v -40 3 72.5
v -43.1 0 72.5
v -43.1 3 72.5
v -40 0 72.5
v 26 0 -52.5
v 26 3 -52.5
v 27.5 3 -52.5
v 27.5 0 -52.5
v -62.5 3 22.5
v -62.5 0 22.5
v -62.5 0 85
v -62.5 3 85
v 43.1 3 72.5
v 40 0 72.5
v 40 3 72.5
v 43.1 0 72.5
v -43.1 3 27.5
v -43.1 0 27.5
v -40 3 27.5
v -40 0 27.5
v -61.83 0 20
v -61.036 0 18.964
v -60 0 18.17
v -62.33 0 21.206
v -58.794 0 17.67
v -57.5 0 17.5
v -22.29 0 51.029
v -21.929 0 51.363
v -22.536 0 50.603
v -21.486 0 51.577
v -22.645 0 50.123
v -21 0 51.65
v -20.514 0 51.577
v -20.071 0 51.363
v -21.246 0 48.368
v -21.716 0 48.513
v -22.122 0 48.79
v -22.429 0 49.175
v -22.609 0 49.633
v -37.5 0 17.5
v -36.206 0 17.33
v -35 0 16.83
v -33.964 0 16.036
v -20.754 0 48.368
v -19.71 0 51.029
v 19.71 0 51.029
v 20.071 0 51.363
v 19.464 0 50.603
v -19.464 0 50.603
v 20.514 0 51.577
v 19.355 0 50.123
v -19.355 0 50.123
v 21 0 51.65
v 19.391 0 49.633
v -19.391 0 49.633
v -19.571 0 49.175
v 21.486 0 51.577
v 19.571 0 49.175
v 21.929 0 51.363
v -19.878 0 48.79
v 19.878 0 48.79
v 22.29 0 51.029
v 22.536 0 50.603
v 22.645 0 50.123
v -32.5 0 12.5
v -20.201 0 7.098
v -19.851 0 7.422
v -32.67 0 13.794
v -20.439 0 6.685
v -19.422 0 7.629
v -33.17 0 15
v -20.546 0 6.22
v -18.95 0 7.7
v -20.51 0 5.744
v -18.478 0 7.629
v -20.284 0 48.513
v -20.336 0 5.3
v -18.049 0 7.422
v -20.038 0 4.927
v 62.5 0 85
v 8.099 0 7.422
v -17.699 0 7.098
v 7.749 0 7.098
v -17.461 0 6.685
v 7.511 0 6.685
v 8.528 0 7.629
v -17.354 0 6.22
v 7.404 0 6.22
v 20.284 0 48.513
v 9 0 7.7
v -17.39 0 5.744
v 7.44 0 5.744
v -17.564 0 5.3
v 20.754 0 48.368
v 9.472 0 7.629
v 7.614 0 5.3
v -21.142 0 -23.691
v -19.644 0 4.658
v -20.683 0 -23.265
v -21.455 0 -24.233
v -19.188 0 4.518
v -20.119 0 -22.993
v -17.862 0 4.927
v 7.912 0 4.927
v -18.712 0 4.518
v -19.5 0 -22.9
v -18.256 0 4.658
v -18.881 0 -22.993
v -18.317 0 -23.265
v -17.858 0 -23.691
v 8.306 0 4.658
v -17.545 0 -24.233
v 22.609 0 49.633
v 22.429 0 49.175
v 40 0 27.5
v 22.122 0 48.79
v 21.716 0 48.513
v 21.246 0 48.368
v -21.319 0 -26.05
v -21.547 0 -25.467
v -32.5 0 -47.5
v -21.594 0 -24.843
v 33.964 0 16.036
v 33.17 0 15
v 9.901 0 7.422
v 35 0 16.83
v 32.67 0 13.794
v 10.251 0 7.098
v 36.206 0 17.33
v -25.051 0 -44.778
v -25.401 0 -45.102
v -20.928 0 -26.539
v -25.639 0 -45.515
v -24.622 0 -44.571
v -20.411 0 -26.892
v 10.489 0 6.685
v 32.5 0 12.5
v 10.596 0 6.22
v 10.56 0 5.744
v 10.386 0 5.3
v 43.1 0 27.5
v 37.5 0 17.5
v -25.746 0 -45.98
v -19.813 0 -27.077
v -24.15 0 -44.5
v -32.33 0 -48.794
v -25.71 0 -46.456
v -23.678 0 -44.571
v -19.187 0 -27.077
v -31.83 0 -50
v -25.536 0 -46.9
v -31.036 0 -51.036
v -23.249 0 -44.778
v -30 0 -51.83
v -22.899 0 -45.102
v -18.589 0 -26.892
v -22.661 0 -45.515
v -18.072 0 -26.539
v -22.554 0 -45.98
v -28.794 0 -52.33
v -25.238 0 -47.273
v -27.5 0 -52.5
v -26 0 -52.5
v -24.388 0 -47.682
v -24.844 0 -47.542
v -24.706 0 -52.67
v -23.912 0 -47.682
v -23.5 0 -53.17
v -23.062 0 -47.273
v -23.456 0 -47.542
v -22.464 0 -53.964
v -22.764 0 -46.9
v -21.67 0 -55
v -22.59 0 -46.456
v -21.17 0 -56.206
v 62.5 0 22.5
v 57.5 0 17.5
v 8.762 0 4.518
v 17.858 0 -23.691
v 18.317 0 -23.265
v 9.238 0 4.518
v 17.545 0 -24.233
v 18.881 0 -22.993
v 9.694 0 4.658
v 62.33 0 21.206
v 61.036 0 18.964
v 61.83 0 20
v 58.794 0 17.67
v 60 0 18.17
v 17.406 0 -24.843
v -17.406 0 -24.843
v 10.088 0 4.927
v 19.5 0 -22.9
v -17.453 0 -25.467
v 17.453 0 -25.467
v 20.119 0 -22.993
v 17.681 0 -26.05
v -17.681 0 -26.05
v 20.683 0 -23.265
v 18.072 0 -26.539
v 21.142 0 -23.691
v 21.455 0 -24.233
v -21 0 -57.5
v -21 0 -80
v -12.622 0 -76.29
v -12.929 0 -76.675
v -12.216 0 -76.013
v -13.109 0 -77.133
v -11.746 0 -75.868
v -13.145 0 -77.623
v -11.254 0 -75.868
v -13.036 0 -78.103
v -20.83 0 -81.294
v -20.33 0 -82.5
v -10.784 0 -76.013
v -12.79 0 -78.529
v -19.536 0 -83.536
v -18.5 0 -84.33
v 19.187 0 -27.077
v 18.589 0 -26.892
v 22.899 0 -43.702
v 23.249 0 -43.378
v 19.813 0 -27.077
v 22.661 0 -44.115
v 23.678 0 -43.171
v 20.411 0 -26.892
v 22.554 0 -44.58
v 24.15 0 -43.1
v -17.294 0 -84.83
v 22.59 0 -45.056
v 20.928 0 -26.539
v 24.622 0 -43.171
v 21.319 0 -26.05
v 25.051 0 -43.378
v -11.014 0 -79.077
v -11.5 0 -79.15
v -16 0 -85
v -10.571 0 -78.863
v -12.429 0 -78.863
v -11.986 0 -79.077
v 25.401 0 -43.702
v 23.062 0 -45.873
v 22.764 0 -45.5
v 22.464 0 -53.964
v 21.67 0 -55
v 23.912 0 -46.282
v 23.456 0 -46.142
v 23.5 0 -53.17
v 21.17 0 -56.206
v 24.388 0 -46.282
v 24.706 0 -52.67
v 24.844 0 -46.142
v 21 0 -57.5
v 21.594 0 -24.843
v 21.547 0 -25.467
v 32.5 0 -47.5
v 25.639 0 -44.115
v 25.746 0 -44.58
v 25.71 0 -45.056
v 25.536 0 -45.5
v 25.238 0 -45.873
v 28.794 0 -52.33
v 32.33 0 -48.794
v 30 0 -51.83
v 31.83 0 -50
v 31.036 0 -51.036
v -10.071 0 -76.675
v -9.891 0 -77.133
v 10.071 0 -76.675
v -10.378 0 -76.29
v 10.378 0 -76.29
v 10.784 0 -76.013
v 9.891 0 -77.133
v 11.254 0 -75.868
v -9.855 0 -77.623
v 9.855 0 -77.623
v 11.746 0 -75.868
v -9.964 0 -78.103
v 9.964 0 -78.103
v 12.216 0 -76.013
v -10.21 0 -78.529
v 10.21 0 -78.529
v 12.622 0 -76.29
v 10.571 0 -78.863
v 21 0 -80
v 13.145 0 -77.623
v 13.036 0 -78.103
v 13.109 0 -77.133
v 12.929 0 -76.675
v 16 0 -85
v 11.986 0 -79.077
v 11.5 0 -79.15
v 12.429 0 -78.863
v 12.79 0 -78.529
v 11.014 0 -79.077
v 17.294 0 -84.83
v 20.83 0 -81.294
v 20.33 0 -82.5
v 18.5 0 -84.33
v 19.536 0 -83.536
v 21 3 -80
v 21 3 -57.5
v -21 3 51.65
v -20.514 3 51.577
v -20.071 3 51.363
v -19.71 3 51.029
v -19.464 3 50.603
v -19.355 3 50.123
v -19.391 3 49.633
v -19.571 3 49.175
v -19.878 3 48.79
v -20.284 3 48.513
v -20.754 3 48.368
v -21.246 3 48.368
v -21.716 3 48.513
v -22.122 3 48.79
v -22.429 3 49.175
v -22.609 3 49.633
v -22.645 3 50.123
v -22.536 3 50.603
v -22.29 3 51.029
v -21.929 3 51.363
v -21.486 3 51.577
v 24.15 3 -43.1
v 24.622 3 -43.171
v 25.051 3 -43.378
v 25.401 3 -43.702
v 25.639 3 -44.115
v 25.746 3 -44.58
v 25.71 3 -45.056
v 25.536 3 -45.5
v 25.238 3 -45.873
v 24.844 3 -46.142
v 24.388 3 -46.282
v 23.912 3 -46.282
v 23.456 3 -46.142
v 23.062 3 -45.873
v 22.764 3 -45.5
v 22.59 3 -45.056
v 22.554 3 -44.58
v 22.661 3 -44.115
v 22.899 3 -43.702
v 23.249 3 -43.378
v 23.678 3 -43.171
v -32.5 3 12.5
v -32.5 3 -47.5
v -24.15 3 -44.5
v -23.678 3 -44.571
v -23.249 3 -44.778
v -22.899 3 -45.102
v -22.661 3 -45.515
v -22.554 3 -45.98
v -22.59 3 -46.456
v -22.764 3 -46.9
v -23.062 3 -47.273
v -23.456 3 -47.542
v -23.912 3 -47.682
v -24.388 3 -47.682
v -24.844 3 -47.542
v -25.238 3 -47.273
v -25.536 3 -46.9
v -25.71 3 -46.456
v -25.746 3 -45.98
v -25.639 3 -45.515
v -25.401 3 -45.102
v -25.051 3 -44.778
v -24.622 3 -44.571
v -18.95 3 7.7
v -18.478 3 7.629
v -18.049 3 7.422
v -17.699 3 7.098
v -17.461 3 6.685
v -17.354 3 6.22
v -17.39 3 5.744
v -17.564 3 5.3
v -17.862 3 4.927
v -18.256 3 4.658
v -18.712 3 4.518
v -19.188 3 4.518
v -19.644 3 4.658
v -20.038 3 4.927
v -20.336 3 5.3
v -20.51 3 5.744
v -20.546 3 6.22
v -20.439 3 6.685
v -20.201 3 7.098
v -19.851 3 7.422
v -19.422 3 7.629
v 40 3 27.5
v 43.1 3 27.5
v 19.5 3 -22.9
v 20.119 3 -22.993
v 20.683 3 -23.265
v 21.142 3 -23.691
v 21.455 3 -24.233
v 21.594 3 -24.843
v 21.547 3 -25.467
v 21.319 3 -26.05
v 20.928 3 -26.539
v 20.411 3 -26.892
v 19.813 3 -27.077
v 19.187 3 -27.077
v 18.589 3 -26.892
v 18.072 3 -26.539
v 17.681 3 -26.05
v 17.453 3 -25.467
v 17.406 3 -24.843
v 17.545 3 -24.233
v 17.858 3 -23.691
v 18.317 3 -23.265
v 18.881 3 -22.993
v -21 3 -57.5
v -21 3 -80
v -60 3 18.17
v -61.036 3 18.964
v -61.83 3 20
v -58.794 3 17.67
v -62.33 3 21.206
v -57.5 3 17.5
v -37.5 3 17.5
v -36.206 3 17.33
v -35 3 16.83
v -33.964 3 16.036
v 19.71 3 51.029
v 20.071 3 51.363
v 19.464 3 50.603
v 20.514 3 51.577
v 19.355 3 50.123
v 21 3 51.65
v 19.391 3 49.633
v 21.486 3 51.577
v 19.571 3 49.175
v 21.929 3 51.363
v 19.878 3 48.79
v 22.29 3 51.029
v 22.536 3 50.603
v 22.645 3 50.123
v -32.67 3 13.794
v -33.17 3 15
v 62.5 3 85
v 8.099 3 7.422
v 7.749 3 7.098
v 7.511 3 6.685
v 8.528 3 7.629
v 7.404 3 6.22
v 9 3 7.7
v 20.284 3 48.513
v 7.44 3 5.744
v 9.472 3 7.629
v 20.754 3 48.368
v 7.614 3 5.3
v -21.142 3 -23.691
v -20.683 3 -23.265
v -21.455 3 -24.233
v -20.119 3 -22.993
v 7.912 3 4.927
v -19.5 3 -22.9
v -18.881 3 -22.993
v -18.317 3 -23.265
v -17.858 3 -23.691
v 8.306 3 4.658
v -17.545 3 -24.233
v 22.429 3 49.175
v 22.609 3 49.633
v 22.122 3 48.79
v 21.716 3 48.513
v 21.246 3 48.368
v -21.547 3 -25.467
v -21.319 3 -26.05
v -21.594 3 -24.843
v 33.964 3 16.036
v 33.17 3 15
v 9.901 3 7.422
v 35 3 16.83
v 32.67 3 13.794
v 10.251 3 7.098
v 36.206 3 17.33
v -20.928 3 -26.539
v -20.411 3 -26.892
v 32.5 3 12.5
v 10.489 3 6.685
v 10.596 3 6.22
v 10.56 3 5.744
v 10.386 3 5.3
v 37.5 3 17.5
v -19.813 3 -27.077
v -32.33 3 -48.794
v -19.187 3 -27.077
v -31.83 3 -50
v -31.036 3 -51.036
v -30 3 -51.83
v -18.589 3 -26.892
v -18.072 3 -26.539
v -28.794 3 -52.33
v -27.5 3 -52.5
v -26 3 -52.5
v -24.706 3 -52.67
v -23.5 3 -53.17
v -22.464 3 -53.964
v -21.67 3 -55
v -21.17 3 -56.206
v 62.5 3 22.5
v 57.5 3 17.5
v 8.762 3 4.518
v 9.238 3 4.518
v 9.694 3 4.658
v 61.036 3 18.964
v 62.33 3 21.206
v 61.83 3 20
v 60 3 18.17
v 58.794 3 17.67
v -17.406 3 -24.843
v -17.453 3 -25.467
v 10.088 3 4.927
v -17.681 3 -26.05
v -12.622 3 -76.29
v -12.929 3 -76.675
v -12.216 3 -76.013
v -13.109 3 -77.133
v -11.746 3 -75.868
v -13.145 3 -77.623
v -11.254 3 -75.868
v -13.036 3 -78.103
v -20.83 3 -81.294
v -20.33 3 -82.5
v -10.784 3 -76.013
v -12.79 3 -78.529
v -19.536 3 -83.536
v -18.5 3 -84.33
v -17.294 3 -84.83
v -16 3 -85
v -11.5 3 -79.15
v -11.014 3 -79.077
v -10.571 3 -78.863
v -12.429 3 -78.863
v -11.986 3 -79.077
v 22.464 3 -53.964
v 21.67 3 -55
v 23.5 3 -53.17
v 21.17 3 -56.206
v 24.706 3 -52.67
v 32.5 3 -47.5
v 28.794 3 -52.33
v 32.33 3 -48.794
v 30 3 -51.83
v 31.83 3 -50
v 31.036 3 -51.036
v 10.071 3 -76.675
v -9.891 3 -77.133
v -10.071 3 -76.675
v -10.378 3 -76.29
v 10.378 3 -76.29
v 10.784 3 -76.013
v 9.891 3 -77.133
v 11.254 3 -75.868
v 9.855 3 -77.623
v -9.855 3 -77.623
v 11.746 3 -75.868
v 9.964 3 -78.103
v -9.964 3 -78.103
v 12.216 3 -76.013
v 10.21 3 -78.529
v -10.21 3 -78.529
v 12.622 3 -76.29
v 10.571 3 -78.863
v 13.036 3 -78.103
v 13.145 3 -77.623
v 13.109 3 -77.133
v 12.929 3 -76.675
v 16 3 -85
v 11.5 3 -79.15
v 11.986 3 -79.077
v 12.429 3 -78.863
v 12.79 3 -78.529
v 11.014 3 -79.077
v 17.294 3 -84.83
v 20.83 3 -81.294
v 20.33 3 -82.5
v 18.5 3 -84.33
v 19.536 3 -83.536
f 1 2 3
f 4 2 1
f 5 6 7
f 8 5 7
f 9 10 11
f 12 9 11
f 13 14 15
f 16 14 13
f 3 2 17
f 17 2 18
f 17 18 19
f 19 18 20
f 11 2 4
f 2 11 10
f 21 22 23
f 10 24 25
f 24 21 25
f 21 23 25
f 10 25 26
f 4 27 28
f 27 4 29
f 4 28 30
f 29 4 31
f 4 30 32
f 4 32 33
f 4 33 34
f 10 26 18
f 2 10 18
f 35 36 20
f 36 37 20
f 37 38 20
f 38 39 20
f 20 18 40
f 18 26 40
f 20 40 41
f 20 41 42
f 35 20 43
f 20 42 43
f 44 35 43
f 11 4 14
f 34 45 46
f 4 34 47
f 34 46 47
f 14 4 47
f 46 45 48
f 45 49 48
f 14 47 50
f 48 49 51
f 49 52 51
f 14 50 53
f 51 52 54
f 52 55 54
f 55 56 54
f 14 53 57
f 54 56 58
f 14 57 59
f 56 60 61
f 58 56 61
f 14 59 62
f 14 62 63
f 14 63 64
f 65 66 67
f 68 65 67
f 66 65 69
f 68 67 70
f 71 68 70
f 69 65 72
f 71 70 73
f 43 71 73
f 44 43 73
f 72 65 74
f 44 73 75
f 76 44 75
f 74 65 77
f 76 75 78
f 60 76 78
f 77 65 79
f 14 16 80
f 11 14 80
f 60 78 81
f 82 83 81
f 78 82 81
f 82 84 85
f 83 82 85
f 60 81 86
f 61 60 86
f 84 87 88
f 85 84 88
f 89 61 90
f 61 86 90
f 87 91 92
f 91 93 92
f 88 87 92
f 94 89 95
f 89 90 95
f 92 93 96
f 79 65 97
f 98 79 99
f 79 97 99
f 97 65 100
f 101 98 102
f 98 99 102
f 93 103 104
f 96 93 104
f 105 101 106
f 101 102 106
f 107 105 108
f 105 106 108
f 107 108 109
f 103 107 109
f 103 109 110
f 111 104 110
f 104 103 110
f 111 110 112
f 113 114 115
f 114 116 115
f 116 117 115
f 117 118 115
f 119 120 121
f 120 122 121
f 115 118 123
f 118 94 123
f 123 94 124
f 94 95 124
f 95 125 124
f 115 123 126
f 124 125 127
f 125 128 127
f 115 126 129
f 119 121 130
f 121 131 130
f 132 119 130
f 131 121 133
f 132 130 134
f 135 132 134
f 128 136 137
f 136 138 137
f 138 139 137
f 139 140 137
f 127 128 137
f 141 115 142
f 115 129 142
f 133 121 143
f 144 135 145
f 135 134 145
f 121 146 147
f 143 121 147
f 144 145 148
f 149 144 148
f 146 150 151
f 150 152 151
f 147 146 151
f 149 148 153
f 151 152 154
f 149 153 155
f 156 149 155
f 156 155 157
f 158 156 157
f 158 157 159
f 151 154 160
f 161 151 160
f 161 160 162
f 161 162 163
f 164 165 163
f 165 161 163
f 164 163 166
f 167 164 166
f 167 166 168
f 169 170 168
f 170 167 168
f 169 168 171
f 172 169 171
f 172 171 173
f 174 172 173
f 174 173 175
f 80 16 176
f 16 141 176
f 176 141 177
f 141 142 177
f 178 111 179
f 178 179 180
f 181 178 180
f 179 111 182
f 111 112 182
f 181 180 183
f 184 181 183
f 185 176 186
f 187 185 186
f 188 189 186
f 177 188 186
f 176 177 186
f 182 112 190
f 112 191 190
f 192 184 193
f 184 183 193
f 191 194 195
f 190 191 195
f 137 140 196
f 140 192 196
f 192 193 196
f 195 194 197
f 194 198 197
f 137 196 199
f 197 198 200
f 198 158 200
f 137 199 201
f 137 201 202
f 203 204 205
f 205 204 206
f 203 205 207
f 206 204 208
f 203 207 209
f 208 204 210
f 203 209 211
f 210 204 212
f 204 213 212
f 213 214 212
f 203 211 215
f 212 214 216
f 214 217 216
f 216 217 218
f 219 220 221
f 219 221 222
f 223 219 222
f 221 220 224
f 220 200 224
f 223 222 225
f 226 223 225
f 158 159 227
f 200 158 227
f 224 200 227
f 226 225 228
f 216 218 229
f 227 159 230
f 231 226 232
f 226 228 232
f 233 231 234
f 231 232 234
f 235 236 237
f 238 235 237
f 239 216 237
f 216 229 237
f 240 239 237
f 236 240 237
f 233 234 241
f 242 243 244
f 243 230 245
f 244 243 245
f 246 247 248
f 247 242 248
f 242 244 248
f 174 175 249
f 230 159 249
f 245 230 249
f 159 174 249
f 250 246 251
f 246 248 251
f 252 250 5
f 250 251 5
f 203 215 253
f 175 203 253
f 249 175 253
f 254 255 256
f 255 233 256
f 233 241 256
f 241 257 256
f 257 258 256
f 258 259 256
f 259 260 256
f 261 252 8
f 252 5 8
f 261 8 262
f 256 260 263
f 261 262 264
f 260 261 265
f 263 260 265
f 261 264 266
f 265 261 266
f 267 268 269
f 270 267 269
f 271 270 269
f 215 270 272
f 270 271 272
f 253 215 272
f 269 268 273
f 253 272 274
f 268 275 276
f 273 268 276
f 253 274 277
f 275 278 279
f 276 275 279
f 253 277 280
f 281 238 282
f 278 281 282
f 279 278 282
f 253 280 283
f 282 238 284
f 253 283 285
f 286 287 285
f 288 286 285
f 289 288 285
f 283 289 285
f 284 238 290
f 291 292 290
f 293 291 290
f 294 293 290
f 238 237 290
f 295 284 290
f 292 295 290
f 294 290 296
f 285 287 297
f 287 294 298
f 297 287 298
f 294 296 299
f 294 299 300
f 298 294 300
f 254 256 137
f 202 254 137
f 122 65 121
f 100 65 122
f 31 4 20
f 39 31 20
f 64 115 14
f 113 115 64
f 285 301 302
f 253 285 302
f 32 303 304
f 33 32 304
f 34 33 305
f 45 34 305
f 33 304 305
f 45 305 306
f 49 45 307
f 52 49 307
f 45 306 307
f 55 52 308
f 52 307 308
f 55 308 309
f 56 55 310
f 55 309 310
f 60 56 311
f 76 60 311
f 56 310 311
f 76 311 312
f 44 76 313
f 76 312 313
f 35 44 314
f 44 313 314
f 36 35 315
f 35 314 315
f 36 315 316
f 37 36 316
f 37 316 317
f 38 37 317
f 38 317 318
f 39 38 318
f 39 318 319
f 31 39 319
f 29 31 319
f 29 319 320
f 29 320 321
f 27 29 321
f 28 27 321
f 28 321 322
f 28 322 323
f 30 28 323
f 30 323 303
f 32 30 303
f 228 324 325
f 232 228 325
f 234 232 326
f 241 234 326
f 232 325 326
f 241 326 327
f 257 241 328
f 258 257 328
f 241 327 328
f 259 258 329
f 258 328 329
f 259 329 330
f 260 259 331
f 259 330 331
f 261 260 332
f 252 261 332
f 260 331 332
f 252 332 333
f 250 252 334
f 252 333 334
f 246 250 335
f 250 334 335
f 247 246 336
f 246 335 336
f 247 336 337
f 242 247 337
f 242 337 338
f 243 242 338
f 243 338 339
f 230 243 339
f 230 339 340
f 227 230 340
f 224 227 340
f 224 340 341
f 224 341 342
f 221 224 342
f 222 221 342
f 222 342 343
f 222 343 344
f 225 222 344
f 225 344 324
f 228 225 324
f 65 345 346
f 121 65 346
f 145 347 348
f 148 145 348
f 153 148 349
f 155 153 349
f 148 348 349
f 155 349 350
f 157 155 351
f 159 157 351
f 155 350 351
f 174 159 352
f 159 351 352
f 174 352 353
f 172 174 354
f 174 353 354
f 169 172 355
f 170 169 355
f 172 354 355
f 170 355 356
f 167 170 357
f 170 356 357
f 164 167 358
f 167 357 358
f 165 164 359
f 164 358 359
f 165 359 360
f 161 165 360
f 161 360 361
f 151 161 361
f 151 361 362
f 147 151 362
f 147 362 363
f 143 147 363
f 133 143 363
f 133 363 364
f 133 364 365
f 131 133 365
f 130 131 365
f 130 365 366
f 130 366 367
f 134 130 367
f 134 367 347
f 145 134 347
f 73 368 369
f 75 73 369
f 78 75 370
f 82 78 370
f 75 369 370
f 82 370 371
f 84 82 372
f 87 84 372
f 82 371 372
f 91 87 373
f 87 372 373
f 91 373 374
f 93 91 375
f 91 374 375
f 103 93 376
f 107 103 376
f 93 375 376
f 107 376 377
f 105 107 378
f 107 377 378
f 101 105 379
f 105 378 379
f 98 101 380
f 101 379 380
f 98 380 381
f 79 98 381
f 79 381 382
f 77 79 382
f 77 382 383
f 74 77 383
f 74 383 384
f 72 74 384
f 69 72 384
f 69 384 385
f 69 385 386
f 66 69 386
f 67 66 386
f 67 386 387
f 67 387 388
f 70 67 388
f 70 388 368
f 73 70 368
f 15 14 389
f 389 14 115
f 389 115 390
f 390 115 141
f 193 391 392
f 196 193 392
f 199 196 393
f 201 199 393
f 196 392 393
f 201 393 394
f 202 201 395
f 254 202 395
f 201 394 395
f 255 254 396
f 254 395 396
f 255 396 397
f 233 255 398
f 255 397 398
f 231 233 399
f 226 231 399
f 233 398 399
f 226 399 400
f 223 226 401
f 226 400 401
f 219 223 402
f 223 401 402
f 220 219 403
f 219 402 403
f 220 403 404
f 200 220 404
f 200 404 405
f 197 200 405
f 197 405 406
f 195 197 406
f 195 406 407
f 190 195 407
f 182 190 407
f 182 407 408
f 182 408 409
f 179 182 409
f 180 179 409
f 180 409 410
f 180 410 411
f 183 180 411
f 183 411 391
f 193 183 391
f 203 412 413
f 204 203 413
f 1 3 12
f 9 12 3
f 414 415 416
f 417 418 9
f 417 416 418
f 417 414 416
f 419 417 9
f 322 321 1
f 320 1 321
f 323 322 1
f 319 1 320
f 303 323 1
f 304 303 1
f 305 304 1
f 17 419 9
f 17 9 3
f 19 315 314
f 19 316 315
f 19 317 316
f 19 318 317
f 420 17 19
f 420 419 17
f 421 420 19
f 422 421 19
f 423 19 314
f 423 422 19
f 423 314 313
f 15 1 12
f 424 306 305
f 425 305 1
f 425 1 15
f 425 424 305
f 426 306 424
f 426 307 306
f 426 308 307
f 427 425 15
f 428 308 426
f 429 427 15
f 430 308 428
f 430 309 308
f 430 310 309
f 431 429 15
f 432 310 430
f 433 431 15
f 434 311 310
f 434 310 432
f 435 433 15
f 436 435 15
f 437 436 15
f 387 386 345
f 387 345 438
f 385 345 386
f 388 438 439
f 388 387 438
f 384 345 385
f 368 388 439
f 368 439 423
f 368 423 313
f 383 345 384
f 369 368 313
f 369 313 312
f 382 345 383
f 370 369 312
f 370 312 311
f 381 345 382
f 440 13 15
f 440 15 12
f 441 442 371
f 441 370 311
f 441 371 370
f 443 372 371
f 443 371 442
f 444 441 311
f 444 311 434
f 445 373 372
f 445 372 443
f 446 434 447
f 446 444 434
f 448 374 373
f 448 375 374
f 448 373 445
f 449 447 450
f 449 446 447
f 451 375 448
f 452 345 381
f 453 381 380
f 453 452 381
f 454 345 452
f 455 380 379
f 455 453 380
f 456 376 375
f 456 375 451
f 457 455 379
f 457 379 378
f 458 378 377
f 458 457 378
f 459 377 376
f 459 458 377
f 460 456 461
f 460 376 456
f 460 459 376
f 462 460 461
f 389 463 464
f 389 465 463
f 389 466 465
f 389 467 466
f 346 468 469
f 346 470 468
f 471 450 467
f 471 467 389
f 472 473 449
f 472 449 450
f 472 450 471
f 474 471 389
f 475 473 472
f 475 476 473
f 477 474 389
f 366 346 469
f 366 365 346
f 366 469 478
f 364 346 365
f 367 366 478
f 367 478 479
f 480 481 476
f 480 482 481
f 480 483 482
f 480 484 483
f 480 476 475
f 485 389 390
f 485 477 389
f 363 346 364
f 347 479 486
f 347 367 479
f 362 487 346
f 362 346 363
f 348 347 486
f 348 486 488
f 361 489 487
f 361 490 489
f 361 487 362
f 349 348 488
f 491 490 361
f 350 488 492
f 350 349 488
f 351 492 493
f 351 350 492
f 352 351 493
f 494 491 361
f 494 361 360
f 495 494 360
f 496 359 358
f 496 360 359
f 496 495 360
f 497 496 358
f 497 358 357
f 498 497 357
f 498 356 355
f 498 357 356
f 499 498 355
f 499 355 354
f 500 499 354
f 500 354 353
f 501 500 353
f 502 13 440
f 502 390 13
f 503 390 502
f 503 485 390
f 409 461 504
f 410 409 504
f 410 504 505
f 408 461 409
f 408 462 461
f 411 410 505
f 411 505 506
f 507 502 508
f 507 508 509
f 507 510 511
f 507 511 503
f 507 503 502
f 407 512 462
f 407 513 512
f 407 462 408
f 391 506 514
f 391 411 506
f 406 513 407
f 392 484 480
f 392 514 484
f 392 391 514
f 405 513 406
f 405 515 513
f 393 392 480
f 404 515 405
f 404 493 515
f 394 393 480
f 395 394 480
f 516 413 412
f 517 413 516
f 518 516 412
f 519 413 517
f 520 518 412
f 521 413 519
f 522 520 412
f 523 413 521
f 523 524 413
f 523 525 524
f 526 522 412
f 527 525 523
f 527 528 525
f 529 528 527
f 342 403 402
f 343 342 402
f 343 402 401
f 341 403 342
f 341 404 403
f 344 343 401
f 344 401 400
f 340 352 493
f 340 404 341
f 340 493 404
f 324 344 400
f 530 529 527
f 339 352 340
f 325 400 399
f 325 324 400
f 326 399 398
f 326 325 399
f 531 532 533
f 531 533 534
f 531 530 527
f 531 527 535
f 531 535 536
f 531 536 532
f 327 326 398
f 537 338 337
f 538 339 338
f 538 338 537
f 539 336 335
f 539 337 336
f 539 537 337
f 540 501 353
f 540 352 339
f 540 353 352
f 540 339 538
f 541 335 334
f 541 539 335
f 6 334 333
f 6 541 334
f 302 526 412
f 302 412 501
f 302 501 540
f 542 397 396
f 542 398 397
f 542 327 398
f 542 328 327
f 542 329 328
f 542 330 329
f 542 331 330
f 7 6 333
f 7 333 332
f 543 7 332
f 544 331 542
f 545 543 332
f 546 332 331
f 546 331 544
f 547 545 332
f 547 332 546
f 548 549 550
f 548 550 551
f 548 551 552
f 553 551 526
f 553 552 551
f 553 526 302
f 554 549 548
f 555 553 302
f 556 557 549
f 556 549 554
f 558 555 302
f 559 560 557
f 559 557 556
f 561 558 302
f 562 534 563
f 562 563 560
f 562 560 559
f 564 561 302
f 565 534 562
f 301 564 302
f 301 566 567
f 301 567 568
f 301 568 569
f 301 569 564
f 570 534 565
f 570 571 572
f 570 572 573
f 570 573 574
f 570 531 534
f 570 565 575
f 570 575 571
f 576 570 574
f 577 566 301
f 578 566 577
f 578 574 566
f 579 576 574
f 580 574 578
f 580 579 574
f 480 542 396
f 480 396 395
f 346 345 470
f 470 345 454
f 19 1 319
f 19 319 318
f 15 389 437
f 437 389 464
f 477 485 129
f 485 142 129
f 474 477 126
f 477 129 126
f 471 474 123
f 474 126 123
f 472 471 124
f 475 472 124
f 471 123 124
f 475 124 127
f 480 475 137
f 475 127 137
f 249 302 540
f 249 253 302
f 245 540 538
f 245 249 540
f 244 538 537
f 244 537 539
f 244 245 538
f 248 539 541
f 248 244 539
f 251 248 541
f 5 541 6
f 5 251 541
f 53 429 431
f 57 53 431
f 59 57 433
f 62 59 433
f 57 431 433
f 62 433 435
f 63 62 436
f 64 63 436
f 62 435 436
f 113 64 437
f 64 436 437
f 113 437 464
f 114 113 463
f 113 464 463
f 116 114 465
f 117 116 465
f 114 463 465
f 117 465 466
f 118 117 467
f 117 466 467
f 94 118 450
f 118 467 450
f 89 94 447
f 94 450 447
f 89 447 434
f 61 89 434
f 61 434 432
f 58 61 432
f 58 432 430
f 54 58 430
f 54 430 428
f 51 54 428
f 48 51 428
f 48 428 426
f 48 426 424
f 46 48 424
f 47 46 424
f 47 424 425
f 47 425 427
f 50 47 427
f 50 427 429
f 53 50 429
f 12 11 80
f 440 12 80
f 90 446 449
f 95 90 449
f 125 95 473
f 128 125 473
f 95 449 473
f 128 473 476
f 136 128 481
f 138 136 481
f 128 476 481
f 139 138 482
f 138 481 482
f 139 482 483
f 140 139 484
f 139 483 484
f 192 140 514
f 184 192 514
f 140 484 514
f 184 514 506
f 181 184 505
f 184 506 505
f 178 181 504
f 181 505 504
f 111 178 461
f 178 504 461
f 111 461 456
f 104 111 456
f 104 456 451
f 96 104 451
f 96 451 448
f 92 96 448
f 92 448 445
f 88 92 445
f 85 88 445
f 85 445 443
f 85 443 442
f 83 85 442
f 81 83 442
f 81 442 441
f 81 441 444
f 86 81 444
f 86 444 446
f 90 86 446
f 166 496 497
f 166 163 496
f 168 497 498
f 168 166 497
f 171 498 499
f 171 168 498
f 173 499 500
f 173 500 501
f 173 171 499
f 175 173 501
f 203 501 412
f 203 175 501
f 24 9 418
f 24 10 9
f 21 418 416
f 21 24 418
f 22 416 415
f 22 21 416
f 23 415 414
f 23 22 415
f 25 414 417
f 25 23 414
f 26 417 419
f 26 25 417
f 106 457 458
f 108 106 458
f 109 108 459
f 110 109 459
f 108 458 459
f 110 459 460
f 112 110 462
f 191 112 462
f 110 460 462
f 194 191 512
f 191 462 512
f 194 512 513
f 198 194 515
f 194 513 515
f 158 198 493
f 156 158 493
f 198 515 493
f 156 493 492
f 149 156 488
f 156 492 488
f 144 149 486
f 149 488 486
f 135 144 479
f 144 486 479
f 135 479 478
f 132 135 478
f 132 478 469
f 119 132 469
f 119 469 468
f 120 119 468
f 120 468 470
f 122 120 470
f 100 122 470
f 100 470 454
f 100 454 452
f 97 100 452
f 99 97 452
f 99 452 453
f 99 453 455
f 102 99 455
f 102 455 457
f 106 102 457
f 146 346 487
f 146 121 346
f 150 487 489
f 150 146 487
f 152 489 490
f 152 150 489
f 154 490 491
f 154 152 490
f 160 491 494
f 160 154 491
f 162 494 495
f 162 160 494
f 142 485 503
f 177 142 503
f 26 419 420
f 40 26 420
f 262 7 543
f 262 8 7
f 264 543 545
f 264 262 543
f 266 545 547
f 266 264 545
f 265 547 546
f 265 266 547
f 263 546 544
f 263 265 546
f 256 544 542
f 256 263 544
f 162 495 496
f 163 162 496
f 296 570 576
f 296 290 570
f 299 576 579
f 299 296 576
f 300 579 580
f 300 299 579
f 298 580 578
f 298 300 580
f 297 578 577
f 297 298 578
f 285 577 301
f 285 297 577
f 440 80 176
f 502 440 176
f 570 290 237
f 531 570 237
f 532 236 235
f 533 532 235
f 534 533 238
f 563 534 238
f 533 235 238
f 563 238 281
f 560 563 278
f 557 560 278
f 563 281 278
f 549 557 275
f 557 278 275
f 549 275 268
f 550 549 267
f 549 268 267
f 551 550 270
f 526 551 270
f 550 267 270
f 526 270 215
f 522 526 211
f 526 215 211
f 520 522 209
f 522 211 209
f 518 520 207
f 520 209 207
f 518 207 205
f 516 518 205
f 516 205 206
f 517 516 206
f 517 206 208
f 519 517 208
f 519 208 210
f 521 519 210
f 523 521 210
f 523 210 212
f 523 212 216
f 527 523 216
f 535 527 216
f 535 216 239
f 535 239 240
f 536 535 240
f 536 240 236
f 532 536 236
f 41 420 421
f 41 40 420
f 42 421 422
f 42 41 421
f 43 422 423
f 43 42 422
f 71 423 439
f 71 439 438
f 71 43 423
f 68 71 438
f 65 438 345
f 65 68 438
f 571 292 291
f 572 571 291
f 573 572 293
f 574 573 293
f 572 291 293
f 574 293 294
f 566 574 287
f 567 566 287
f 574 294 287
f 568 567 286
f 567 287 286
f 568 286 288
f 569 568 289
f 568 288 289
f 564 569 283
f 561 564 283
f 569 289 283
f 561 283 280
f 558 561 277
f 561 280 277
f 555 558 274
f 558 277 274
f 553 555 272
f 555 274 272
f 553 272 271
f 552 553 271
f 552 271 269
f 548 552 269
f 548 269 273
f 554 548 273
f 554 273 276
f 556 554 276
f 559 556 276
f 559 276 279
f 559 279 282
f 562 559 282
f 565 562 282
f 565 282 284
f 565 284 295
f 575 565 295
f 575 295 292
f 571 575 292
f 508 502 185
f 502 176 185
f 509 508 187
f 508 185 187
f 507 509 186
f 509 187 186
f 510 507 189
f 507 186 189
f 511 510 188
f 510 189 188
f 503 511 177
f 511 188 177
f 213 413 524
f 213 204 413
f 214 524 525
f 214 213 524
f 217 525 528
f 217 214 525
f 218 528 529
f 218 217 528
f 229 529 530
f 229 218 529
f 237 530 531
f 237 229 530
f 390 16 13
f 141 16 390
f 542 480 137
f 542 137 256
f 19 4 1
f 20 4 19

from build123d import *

# Parameters (mm, degrees)
SKETCH1_W           = 3.1
SKETCH1_H           = 45
BOSS_EXTRUDE1_DEPTH = 3
SKETCH3_R           = 1.6
CUT_EXTRUDE2_DEPTH  = 10
CUT_EXTRUDE4_REACH  = 107.547
SKETCH5_R           = 1.65
SKETCH6_R           = 1.65
CUT_EXTRUDE5_DEPTH  = 10
SKETCH8_W           = 30
SKETCH8_H           = 70
CUT_EXTRUDE6_DEPTH  = 10
FILLET1_R           = 5
SKETCH9_R           = 2.1
CUT_EXTRUDE7_DEPTH  = 10


with BuildPart() as part:
    # Sketch1 → Boss-Extrude1 (new body)
    with BuildSketch(Plane(origin=(0, 0, 0), x_dir=(1, 0, 0), z_dir=(0, 1, 0))):
        Polygon((-62.5, -75), (-62.5, -85), (62.5, -85), (62.5, -75), (62.5, -5), (62.5, 85), (-62.5, 85), (-62.5, -5), align=None)
        with Locations((-41.55, -50)):
            Rectangle(SKETCH1_W, SKETCH1_H, mode=Mode.SUBTRACT)
        with Locations((41.55, -50)):
            Rectangle(SKETCH1_W, SKETCH1_H, mode=Mode.SUBTRACT)
    extrude(amount=BOSS_EXTRUDE1_DEPTH)

    # Sketch3 → Cut-Extrude2 (cut)
    with BuildSketch(Plane(origin=(0, 3, 0), x_dir=(1, 0, 0), z_dir=(0, 1, 0))):
        with Locations(Location((-24.15, 46.1, 0), (0, 0, 270))):
            Circle(SKETCH3_R)
        with Locations(Location((24.15, 44.7, 0), (0, 0, 270))):
            Circle(SKETCH3_R)
        with Locations(Location((-18.95, -6.1, 0), (0, 0, 270))):
            Circle(SKETCH3_R)
        with Locations(Location((9, -6.1, 0), (0, 0, 270))):
            Circle(SKETCH3_R)
    extrude(amount=-CUT_EXTRUDE2_DEPTH, mode=Mode.SUBTRACT)

    # Sketch5 → Cut-Extrude4 (cut, up to next)
    with BuildSketch(Plane.XZ, mode=Mode.PRIVATE) as cut_extrude4_sk1:
        with Locations(Location((11.5, -77.5, 0), (0, 0, 270))):
            Circle(SKETCH5_R)
    cut_extrude4_tool1 = extrude(cut_extrude4_sk1.sketch, amount=-CUT_EXTRUDE4_REACH, mode=Mode.PRIVATE) & part.part
    # Sketch5 → Cut-Extrude4 (cut, up to next)
    with BuildSketch(Plane.XZ, mode=Mode.PRIVATE) as cut_extrude4_sk2:
        with Locations(Location((-11.5, -77.5, 0), (0, 0, 270))):
            Circle(SKETCH5_R)
    cut_extrude4_tool2 = extrude(cut_extrude4_sk2.sketch, amount=-CUT_EXTRUDE4_REACH, mode=Mode.PRIVATE) & part.part
    add(cut_extrude4_tool1.solids().sort_by_distance((11.5, 0, -77.5))[0], mode=Mode.SUBTRACT)
    add(cut_extrude4_tool2.solids().sort_by_distance((-11.5, 0, -77.5))[0], mode=Mode.SUBTRACT)

    # Sketch6 → Cut-Extrude5 (cut)
    with BuildSketch(Plane(origin=(0, 3, 0), x_dir=(1, 0, 0), z_dir=(0, 1, 0))):
        with Locations(Location((21, -50, 0), (0, 0, 270))):
            Circle(SKETCH6_R)
        with Locations(Location((-21, -50, 0), (0, 0, 270))):
            Circle(SKETCH6_R)
    extrude(amount=-CUT_EXTRUDE5_DEPTH, mode=Mode.SUBTRACT)

    # Sketch8 → Cut-Extrude6 (cut)
    with BuildSketch(Plane(origin=(0, 3, 0), x_dir=(1, 0, 0), z_dir=(0, 1, 0))):
        with Locations((-47.5, 17.5)):
            Rectangle(SKETCH8_W, SKETCH8_H)
        Polygon((-21, 52.5), (-21, 85), (-62.5, 85), (-62.5, 52.5), (-32.5, 52.5), align=None)
        Polygon((32.5, 52.5), (62.5, 52.5), (62.5, 85), (21, 85), (21, 52.5), align=None)
        with Locations((47.5, 17.5)):
            Rectangle(SKETCH8_W, SKETCH8_H)
    extrude(amount=-CUT_EXTRUDE6_DEPTH, mode=Mode.SUBTRACT)

    # Fillet1
    fillet1_edges = [part.edges().sort_by_distance(p)[0] for p in [
        (21, 1.5, -52.5),
        (21, 1.5, -85),
        (62.5, 1.5, 17.5),
        (32.5, 1.5, 17.5),
        (32.5, 1.5, -52.5),
        (-32.5, 1.5, -52.5),
        (-32.5, 1.5, 17.5),
        (-62.5, 1.5, 17.5),
        (-21, 1.5, -85),
        (-21, 1.5, -52.5),
    ]]
    fillet(fillet1_edges, radius=FILLET1_R)

    # Sketch9 → Cut-Extrude7 (cut)
    with BuildSketch(Plane(origin=(0, 3, 0), x_dir=(1, 0, 0), z_dir=(0, 1, 0))):
        with Locations(Location((19.5, 25, 0), (0, 0, 270))):
            Circle(SKETCH9_R)
        with Locations(Location((-19.5, 25, 0), (0, 0, 270))):
            Circle(SKETCH9_R)
    extrude(amount=-CUT_EXTRUDE7_DEPTH, mode=Mode.SUBTRACT)


solid = part.part
